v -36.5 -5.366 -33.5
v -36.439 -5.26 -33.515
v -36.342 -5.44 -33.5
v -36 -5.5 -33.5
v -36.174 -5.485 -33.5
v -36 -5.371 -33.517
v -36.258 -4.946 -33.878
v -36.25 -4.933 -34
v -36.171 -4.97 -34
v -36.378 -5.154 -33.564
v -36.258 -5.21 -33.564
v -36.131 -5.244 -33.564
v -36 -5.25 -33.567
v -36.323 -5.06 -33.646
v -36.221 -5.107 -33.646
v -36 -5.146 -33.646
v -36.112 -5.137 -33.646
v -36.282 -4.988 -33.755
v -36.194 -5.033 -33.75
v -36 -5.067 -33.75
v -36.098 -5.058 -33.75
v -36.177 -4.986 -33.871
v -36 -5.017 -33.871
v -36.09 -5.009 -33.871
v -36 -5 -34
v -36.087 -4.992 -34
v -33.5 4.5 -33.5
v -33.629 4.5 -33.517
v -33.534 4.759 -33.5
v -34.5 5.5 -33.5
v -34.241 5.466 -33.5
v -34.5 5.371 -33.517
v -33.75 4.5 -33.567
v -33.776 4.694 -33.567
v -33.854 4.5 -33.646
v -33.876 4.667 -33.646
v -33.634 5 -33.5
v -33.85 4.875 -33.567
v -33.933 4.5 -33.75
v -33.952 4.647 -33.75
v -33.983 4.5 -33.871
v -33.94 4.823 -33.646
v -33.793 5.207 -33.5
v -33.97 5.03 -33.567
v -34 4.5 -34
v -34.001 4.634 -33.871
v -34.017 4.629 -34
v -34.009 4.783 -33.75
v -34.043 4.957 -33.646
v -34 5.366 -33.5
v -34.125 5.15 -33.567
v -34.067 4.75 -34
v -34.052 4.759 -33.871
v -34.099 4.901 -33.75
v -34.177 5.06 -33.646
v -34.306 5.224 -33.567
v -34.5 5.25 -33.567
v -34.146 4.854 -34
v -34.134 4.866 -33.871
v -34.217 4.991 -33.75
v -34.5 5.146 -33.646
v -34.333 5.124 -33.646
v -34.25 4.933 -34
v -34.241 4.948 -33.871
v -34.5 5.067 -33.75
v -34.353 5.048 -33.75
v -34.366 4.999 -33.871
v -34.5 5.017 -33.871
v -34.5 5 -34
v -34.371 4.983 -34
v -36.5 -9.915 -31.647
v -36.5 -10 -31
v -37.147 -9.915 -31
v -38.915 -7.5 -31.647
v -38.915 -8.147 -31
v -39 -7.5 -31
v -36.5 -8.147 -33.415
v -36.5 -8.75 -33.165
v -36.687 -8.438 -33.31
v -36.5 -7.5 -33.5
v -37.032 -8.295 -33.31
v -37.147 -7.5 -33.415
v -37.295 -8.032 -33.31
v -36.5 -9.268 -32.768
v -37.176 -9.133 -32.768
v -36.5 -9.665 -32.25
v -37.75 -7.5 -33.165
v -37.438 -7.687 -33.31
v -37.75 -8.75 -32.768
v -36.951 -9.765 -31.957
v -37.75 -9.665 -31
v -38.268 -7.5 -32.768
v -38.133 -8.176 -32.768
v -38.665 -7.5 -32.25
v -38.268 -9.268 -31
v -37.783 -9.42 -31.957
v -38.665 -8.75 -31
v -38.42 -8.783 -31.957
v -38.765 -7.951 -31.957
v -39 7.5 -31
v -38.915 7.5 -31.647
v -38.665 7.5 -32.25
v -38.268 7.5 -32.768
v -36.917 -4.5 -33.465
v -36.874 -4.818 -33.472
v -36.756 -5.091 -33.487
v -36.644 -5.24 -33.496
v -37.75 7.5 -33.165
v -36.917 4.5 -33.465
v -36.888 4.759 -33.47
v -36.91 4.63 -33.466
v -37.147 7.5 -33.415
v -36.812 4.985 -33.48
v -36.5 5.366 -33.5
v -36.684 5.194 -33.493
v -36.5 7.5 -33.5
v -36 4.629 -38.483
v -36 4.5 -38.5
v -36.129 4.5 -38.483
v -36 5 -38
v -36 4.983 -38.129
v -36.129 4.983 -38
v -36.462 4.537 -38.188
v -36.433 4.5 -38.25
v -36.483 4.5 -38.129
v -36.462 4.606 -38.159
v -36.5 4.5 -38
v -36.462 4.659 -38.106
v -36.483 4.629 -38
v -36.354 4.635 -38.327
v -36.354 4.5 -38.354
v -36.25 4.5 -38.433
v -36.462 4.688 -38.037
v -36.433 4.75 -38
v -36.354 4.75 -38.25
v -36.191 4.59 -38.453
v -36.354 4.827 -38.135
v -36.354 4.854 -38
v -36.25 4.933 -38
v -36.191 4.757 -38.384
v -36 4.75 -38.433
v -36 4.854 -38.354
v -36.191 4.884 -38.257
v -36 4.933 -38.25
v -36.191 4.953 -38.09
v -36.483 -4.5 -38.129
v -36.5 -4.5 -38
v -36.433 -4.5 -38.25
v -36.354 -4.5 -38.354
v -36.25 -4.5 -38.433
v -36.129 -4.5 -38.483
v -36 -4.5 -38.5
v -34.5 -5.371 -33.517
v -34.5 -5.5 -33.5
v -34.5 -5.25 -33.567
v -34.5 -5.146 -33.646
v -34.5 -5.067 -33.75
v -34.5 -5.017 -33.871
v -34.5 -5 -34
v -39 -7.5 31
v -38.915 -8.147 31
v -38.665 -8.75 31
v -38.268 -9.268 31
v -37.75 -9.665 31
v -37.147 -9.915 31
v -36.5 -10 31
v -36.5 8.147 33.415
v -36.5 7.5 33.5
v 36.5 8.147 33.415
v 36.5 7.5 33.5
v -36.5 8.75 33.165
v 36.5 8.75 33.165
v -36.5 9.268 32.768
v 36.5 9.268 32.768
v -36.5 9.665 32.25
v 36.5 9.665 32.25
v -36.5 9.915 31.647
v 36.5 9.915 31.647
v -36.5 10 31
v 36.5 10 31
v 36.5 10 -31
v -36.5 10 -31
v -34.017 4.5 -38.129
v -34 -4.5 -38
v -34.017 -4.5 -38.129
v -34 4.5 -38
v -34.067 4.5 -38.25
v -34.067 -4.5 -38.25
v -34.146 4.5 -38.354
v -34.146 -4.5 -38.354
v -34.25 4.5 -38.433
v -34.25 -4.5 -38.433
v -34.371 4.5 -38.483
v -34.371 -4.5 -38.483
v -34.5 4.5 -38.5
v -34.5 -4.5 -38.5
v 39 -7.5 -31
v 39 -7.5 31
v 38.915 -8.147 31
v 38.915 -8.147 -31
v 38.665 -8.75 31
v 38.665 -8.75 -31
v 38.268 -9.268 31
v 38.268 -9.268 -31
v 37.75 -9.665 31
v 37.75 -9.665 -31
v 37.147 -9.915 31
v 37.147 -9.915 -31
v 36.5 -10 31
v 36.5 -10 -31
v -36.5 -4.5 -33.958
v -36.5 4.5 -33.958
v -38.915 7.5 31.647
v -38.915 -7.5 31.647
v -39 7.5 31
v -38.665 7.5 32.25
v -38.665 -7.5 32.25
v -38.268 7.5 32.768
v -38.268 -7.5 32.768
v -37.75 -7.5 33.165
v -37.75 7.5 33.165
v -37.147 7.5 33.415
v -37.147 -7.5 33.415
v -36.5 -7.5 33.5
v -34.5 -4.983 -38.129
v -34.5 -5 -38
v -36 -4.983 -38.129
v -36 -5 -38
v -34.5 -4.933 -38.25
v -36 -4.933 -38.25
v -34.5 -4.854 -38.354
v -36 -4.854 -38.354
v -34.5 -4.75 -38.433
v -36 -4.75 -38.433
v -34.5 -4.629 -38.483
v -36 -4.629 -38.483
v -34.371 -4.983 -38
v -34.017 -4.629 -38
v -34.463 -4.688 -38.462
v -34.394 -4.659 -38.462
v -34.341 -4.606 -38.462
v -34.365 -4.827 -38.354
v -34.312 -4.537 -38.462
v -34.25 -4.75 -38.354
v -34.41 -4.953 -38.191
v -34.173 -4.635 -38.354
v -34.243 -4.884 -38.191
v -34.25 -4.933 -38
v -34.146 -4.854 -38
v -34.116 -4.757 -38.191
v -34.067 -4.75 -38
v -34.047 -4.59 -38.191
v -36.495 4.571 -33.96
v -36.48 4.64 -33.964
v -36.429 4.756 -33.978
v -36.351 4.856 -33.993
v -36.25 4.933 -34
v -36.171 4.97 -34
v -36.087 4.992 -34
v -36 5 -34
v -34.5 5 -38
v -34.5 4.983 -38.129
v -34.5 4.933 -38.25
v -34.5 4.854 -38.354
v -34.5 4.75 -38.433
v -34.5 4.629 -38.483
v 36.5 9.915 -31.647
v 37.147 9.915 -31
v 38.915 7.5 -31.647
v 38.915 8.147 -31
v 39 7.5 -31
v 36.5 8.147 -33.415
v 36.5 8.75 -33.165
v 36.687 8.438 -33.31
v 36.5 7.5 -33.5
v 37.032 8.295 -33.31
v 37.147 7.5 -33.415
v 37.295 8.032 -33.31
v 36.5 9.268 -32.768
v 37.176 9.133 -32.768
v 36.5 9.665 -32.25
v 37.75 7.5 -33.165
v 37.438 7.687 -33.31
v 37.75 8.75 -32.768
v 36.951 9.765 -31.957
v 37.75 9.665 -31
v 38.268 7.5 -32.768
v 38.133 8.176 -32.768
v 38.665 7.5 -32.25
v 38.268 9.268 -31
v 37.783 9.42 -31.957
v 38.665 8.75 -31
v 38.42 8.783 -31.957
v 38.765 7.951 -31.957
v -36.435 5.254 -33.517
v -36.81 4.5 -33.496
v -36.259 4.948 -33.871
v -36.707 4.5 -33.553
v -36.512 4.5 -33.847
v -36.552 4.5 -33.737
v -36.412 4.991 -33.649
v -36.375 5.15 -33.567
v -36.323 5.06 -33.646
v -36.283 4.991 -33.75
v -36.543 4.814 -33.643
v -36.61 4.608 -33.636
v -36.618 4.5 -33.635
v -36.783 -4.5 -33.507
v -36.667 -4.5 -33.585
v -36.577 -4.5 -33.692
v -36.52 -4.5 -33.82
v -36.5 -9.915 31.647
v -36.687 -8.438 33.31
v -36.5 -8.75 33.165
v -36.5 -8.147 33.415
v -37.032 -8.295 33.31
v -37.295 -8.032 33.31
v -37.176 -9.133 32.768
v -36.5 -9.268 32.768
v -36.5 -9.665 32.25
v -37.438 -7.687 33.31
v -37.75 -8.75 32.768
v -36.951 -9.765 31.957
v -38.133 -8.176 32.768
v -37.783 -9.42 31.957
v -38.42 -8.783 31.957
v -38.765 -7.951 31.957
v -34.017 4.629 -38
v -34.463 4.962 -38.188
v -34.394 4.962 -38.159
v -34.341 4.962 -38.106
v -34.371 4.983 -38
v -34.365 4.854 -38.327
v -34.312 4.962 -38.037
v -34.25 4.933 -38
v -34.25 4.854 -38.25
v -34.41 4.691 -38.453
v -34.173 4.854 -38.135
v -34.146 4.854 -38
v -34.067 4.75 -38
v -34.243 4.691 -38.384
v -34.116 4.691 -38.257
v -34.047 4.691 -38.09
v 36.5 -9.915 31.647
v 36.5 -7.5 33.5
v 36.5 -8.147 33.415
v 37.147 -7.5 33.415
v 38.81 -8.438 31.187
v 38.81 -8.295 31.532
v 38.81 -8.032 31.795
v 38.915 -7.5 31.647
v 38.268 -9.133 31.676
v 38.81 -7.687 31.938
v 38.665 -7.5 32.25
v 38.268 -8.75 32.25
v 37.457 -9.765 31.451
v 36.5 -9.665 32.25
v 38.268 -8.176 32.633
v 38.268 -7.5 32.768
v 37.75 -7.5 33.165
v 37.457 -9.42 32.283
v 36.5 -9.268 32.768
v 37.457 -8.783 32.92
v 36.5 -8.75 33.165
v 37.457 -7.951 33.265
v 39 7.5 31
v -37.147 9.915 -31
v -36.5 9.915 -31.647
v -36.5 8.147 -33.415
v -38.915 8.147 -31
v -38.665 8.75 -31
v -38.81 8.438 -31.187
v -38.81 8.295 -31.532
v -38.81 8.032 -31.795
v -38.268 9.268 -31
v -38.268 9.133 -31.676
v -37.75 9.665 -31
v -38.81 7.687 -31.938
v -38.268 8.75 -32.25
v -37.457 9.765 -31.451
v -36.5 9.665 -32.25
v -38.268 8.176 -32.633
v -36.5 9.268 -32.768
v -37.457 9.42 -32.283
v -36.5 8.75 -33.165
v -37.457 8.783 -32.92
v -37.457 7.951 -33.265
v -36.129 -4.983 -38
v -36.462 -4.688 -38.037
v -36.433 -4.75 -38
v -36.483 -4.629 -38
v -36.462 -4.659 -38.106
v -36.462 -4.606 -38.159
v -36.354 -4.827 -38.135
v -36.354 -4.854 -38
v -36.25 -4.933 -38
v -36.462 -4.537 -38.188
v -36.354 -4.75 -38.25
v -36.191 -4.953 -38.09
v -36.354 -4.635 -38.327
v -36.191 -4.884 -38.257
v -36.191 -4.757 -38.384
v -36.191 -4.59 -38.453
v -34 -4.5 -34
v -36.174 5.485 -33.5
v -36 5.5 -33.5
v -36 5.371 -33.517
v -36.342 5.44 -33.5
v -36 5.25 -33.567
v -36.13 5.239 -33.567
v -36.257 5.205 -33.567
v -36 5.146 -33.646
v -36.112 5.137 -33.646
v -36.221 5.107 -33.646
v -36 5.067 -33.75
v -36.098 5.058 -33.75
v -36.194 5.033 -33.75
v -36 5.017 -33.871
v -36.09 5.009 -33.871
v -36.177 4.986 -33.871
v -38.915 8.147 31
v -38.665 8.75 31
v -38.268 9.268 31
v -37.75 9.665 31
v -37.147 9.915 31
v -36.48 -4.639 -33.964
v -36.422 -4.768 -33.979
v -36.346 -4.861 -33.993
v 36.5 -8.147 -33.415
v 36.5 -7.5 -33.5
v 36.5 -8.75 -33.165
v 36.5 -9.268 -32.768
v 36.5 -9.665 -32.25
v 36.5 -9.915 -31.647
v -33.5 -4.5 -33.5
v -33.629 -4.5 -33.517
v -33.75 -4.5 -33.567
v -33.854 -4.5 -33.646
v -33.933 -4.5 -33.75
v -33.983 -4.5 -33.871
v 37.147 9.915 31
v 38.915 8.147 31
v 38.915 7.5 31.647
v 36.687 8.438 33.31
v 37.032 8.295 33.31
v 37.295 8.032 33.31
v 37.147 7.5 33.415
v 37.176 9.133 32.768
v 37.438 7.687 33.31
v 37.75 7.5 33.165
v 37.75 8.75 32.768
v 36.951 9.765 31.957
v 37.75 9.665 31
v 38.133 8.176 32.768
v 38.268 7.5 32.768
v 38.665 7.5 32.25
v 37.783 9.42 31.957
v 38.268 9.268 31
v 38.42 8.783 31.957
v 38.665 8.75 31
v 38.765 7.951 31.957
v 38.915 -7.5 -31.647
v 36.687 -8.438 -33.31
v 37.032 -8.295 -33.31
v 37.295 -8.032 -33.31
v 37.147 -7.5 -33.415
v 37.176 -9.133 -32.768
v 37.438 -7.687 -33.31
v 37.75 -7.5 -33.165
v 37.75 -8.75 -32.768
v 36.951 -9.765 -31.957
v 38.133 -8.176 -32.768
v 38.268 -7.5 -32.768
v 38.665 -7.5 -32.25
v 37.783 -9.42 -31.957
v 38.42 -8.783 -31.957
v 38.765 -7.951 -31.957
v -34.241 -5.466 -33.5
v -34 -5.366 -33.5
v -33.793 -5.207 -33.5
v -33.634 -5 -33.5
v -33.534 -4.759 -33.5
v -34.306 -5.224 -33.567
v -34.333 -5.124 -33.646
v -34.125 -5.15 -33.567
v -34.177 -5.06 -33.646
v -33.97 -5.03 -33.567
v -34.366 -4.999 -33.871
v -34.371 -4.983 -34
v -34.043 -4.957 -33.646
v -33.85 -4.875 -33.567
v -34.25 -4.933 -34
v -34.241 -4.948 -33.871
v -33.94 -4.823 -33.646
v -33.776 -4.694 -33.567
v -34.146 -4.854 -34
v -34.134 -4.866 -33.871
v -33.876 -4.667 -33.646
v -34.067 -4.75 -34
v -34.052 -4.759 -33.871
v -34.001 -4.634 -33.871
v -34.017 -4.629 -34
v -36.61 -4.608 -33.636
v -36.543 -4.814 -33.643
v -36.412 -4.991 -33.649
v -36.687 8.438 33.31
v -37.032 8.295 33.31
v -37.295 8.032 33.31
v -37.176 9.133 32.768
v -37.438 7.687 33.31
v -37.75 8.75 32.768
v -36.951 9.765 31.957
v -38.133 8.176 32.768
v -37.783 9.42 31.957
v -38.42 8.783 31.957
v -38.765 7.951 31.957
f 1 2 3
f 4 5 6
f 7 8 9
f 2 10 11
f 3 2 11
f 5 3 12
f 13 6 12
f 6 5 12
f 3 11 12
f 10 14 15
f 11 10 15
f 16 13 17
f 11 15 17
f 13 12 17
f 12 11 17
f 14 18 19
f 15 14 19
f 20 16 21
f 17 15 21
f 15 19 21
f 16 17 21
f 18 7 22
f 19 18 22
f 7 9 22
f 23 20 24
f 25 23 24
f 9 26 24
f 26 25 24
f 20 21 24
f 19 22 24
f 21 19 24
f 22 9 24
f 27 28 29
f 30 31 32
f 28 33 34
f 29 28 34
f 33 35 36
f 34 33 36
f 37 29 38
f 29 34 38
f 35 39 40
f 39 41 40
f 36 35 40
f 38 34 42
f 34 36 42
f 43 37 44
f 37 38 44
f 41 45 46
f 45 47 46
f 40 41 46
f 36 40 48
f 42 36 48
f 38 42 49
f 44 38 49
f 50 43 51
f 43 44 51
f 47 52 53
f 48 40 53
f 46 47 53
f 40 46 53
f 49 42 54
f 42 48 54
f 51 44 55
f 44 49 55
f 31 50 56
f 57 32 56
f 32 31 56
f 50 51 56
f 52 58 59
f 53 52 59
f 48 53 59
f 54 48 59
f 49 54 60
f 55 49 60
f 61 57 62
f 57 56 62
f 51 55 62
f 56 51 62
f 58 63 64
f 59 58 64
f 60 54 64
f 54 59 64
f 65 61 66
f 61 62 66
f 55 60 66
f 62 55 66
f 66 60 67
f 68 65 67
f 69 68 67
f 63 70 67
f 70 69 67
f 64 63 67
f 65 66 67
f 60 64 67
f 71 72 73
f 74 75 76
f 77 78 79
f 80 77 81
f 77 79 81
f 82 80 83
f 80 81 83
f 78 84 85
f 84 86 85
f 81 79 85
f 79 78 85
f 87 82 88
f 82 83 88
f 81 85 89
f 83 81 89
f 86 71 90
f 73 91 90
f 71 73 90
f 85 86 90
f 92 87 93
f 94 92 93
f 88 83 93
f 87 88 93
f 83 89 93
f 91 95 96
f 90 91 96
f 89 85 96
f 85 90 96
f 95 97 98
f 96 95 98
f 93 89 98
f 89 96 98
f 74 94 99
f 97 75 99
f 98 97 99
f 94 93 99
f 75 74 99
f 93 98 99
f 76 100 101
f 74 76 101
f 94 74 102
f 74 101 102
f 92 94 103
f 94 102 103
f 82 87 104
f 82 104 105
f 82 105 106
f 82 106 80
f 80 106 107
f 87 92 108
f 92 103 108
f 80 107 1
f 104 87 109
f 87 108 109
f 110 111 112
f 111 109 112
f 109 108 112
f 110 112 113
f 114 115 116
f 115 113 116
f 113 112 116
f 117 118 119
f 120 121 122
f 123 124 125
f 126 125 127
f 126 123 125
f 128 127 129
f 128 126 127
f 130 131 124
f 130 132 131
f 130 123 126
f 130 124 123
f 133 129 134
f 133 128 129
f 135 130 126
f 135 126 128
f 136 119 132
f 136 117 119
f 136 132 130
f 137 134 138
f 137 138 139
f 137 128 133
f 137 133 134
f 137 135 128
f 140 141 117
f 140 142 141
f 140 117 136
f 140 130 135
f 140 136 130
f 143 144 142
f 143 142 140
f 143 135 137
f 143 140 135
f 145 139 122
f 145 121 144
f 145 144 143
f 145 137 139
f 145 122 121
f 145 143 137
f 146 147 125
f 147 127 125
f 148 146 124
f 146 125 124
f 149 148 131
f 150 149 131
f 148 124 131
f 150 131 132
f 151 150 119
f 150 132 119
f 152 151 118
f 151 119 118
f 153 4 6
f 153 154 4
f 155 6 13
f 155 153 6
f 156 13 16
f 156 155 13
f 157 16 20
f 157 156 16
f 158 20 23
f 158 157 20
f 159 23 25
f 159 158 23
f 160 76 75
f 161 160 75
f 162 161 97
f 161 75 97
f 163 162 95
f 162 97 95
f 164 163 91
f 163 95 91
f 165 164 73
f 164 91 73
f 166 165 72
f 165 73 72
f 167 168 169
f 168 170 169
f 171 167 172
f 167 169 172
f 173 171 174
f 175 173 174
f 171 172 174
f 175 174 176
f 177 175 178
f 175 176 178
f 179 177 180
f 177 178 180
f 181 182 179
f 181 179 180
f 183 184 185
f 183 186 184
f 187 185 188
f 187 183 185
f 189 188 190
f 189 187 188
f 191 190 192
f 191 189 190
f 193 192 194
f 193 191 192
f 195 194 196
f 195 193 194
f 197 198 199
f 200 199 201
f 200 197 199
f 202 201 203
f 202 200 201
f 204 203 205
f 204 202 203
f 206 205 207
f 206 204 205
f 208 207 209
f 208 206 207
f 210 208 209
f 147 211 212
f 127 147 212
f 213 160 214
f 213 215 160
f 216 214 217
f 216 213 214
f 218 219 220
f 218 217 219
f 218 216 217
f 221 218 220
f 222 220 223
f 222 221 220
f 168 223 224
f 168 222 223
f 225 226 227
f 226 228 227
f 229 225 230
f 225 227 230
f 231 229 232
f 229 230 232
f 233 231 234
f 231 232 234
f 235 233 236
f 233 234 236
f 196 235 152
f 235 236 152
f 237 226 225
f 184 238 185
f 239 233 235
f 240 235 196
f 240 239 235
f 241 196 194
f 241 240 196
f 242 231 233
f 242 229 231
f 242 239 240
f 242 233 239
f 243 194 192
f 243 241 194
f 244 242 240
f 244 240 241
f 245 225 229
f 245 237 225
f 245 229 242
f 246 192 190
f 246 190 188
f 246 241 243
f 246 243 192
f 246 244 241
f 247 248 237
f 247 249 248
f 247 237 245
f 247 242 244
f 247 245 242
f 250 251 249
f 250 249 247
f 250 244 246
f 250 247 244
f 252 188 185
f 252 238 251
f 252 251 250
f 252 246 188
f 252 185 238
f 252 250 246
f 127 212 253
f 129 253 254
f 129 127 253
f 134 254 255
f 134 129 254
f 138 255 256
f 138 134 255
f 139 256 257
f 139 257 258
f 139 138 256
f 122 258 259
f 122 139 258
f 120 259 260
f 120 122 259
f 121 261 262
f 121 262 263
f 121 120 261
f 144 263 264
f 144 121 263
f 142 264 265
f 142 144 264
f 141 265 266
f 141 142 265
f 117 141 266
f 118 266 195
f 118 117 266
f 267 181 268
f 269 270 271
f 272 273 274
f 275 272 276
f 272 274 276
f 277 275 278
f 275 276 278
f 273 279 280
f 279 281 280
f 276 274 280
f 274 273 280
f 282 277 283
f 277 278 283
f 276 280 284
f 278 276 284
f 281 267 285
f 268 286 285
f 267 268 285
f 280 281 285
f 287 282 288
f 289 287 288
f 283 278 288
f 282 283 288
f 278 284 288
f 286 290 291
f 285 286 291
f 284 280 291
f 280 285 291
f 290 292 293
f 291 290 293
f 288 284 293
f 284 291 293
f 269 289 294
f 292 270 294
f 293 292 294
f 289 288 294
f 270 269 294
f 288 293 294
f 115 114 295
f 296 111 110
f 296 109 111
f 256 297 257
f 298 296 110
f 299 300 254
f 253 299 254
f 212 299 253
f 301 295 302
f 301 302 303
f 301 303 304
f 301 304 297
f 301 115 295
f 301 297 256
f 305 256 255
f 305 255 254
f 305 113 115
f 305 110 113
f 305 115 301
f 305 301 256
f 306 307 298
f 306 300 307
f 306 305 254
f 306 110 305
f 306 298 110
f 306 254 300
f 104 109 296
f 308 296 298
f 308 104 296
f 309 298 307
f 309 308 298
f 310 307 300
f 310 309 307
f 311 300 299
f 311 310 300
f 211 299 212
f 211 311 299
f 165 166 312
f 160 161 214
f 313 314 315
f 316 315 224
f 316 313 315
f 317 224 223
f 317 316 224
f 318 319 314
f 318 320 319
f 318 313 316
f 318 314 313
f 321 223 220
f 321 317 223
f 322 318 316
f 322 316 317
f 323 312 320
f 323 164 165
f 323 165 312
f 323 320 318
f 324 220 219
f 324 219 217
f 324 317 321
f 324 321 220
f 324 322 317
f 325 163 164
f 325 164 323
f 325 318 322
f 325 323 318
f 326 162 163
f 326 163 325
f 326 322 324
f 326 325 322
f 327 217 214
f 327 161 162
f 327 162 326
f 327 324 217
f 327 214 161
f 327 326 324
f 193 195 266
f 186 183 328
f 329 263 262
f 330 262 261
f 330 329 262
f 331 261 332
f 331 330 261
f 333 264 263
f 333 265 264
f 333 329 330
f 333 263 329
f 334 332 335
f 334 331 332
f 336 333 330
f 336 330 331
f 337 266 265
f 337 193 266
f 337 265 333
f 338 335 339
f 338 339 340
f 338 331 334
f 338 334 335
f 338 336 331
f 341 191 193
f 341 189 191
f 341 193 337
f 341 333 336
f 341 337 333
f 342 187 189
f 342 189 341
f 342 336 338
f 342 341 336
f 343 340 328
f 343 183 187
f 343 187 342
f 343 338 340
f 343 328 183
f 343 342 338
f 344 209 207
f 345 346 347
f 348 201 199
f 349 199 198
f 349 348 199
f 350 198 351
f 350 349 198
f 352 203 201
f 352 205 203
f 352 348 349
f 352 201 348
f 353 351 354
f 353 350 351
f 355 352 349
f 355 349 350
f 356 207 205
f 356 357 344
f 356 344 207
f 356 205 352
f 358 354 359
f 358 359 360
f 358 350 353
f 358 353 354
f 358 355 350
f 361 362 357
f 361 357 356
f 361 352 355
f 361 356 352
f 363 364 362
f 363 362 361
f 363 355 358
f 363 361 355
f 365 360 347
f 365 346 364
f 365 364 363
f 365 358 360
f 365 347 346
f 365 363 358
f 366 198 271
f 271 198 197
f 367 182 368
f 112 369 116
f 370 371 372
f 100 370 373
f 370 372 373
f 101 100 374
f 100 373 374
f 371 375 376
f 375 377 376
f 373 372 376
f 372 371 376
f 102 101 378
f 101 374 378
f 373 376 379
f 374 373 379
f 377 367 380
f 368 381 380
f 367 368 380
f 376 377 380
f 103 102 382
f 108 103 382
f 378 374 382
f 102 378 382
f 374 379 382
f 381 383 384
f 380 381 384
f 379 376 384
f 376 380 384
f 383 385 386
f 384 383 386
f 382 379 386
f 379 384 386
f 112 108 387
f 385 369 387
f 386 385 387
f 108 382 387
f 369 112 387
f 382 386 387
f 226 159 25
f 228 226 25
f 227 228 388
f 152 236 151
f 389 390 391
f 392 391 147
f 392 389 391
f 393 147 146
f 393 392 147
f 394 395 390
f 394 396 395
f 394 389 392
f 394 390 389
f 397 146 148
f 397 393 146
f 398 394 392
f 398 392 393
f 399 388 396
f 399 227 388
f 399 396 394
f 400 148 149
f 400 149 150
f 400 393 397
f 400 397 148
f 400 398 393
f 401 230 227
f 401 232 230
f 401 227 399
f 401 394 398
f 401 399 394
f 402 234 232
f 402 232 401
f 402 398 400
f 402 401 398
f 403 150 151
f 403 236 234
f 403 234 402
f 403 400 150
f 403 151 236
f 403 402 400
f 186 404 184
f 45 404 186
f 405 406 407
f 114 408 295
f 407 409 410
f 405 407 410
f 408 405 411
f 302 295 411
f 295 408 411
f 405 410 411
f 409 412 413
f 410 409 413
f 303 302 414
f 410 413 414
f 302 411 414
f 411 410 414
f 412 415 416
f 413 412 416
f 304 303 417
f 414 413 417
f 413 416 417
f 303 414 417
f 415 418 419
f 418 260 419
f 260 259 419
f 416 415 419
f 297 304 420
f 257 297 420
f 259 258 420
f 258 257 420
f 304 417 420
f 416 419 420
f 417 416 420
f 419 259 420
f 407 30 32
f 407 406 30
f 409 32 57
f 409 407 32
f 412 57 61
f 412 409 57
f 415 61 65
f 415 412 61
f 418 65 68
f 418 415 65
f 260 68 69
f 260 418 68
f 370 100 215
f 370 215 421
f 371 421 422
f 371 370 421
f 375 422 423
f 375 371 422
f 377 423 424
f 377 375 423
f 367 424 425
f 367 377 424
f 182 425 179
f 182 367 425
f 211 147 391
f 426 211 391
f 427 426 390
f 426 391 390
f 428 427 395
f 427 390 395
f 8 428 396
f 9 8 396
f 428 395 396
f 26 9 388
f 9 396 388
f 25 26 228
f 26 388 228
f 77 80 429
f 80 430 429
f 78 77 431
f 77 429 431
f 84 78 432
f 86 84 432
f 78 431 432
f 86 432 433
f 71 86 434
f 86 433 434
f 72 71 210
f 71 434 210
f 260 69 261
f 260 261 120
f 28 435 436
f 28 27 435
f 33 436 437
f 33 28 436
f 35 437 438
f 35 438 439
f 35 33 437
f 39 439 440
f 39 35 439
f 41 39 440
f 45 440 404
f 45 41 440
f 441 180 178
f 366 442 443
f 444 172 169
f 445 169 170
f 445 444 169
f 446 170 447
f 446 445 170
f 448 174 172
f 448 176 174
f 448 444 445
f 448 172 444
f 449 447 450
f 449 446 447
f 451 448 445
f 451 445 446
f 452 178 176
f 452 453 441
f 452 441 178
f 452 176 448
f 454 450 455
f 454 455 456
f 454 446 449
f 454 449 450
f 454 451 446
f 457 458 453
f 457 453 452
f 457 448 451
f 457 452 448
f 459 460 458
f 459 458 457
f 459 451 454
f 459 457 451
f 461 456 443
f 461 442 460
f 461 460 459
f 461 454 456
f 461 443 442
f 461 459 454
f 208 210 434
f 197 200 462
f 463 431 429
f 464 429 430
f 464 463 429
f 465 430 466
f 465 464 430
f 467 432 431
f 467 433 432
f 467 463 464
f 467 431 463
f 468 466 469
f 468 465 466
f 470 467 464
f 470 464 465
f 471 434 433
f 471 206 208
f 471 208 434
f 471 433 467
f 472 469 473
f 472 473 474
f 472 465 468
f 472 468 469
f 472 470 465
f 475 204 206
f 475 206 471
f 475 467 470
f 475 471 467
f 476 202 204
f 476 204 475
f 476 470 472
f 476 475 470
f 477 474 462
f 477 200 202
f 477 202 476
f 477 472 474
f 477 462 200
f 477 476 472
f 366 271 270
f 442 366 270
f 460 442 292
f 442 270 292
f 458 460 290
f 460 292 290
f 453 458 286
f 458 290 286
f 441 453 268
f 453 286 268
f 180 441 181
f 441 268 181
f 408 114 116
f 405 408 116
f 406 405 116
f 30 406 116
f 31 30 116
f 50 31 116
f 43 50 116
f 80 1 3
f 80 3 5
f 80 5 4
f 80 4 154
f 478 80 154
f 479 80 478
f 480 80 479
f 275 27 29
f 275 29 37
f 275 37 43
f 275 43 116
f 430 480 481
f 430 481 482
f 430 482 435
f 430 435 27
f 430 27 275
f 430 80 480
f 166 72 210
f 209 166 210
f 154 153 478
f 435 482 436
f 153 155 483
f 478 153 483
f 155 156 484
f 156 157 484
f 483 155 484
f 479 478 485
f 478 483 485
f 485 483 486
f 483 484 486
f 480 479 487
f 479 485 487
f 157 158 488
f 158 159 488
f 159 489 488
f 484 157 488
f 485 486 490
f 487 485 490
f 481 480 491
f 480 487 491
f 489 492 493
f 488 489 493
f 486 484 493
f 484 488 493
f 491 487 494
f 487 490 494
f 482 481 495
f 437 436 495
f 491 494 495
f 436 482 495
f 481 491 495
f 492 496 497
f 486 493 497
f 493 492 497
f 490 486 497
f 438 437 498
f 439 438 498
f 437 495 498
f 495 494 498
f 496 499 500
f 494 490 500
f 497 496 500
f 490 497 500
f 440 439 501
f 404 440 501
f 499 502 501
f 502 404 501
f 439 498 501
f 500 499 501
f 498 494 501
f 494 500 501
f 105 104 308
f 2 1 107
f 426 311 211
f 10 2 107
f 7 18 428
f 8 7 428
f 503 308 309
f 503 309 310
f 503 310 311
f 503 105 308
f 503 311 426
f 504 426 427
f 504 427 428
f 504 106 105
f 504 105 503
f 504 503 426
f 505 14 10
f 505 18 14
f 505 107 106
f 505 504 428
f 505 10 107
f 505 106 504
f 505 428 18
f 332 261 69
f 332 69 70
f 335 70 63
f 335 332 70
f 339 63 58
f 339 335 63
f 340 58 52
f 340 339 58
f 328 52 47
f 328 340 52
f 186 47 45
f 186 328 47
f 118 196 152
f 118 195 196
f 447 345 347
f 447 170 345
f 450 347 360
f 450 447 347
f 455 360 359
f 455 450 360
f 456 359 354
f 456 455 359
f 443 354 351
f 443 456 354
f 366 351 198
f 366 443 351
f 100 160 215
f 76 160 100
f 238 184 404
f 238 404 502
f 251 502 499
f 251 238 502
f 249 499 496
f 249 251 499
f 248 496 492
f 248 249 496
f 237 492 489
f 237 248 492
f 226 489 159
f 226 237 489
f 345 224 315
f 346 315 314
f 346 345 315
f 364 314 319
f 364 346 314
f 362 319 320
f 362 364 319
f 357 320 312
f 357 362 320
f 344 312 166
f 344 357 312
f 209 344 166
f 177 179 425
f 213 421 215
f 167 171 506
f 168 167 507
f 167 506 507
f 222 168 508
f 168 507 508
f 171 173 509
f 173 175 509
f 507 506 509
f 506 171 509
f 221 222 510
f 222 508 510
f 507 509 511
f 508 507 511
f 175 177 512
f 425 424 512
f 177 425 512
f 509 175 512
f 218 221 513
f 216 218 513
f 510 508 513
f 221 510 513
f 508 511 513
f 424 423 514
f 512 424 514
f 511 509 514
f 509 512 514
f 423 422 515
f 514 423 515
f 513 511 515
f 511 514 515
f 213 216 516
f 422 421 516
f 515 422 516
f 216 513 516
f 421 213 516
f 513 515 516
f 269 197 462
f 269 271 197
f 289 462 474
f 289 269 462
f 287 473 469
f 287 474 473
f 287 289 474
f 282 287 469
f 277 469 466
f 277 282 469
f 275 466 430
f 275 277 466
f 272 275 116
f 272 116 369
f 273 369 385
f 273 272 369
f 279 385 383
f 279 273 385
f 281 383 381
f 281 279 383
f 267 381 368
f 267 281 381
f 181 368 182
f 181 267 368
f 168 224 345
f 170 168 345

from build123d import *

# Parameters (mm, degrees)
BOSS_EXTRUDE1_DEPTH      = 10
BOSS_EXTRUDE1_DEPTH_BACK = 10
SKETCH1_W                = 78
SKETCH1_H                = 67
FILLET1_R                = 2.5
SKETCH2_W                = 2.5
SKETCH2_H                = 10
BOSS_EXTRUDE2_DEPTH      = 5
FILLET2_R                = 0.5


with BuildPart() as part:
    # Sketch1 → Boss-Extrude1 (new, two sides: drawn at the far end of the back side and taken through both)
    with BuildSketch(Plane(origin=(0, 0, 0), x_dir=(1, 0, 0), z_dir=(0, 1, 0)).offset(-BOSS_EXTRUDE1_DEPTH_BACK)):
        Rectangle(SKETCH1_W, SKETCH1_H)
    extrude(amount=BOSS_EXTRUDE1_DEPTH + BOSS_EXTRUDE1_DEPTH_BACK)

    # Fillet1
    fillet1_edges = [part.edges().sort_by_distance(p)[0] for p in [
        (-39, -10, 0),
        (39, 10, 0),
        (0, 10, -33.5),
        (0, -10, 33.5),
        (-39, 10, 0),
        (0, 10, 33.5),
        (39, -10, 0),
        (0, -10, -33.5),
        (39, 0, 33.5),
        (-39, 0, 33.5),
        (-39, 0, -33.5),
        (39, 0, -33.5),
    ]]
    fillet(fillet1_edges, radius=FILLET1_R)

    # Sketch2 → Boss-Extrude2 (add)
    with BuildSketch(Plane(origin=(0, 0, -33.5), x_dir=(-1, 0, 0), z_dir=(0, 0, -1))):
        with Locations((35.25, 0)):
            Rectangle(SKETCH2_W, SKETCH2_H)
    extrude(amount=BOSS_EXTRUDE2_DEPTH)

    # Fillet2
    fillet2_edges = [part.edges().sort_by_distance(p)[0] for p in [
        (-34, -5, -36),
        (-35.25, -5, -38.5),
        (-34, 0, -38.5),
        (-35.25, 5, -38.5),
        (-34, 5, -36),
        (-36.5, -5, -36),
        (-36.5, 0, -38.5),
        (-36.5, 5, -36),
    ]]
    fillet(fillet2_edges, radius=FILLET2_R)
    fillet2_2_edges = [part.edges().sort_by_distance(p)[0] for p in [
        (-34, 0, -33.5),
        (-35.25, -5, -33.5),
        (-35.25, 5, -33.5),
        (-36.5, 0, -33.5),
        (-36.353553391, 4.853553391, -33.5),
        (-36.353553391, -4.853553391, -33.5),
        (-34.146446609, 4.853553391, -33.5),
        (-34.146446609, -4.853553391, -33.5),
    ]]
    fillet(fillet2_2_edges, radius=FILLET2_R)


solid = part.part
